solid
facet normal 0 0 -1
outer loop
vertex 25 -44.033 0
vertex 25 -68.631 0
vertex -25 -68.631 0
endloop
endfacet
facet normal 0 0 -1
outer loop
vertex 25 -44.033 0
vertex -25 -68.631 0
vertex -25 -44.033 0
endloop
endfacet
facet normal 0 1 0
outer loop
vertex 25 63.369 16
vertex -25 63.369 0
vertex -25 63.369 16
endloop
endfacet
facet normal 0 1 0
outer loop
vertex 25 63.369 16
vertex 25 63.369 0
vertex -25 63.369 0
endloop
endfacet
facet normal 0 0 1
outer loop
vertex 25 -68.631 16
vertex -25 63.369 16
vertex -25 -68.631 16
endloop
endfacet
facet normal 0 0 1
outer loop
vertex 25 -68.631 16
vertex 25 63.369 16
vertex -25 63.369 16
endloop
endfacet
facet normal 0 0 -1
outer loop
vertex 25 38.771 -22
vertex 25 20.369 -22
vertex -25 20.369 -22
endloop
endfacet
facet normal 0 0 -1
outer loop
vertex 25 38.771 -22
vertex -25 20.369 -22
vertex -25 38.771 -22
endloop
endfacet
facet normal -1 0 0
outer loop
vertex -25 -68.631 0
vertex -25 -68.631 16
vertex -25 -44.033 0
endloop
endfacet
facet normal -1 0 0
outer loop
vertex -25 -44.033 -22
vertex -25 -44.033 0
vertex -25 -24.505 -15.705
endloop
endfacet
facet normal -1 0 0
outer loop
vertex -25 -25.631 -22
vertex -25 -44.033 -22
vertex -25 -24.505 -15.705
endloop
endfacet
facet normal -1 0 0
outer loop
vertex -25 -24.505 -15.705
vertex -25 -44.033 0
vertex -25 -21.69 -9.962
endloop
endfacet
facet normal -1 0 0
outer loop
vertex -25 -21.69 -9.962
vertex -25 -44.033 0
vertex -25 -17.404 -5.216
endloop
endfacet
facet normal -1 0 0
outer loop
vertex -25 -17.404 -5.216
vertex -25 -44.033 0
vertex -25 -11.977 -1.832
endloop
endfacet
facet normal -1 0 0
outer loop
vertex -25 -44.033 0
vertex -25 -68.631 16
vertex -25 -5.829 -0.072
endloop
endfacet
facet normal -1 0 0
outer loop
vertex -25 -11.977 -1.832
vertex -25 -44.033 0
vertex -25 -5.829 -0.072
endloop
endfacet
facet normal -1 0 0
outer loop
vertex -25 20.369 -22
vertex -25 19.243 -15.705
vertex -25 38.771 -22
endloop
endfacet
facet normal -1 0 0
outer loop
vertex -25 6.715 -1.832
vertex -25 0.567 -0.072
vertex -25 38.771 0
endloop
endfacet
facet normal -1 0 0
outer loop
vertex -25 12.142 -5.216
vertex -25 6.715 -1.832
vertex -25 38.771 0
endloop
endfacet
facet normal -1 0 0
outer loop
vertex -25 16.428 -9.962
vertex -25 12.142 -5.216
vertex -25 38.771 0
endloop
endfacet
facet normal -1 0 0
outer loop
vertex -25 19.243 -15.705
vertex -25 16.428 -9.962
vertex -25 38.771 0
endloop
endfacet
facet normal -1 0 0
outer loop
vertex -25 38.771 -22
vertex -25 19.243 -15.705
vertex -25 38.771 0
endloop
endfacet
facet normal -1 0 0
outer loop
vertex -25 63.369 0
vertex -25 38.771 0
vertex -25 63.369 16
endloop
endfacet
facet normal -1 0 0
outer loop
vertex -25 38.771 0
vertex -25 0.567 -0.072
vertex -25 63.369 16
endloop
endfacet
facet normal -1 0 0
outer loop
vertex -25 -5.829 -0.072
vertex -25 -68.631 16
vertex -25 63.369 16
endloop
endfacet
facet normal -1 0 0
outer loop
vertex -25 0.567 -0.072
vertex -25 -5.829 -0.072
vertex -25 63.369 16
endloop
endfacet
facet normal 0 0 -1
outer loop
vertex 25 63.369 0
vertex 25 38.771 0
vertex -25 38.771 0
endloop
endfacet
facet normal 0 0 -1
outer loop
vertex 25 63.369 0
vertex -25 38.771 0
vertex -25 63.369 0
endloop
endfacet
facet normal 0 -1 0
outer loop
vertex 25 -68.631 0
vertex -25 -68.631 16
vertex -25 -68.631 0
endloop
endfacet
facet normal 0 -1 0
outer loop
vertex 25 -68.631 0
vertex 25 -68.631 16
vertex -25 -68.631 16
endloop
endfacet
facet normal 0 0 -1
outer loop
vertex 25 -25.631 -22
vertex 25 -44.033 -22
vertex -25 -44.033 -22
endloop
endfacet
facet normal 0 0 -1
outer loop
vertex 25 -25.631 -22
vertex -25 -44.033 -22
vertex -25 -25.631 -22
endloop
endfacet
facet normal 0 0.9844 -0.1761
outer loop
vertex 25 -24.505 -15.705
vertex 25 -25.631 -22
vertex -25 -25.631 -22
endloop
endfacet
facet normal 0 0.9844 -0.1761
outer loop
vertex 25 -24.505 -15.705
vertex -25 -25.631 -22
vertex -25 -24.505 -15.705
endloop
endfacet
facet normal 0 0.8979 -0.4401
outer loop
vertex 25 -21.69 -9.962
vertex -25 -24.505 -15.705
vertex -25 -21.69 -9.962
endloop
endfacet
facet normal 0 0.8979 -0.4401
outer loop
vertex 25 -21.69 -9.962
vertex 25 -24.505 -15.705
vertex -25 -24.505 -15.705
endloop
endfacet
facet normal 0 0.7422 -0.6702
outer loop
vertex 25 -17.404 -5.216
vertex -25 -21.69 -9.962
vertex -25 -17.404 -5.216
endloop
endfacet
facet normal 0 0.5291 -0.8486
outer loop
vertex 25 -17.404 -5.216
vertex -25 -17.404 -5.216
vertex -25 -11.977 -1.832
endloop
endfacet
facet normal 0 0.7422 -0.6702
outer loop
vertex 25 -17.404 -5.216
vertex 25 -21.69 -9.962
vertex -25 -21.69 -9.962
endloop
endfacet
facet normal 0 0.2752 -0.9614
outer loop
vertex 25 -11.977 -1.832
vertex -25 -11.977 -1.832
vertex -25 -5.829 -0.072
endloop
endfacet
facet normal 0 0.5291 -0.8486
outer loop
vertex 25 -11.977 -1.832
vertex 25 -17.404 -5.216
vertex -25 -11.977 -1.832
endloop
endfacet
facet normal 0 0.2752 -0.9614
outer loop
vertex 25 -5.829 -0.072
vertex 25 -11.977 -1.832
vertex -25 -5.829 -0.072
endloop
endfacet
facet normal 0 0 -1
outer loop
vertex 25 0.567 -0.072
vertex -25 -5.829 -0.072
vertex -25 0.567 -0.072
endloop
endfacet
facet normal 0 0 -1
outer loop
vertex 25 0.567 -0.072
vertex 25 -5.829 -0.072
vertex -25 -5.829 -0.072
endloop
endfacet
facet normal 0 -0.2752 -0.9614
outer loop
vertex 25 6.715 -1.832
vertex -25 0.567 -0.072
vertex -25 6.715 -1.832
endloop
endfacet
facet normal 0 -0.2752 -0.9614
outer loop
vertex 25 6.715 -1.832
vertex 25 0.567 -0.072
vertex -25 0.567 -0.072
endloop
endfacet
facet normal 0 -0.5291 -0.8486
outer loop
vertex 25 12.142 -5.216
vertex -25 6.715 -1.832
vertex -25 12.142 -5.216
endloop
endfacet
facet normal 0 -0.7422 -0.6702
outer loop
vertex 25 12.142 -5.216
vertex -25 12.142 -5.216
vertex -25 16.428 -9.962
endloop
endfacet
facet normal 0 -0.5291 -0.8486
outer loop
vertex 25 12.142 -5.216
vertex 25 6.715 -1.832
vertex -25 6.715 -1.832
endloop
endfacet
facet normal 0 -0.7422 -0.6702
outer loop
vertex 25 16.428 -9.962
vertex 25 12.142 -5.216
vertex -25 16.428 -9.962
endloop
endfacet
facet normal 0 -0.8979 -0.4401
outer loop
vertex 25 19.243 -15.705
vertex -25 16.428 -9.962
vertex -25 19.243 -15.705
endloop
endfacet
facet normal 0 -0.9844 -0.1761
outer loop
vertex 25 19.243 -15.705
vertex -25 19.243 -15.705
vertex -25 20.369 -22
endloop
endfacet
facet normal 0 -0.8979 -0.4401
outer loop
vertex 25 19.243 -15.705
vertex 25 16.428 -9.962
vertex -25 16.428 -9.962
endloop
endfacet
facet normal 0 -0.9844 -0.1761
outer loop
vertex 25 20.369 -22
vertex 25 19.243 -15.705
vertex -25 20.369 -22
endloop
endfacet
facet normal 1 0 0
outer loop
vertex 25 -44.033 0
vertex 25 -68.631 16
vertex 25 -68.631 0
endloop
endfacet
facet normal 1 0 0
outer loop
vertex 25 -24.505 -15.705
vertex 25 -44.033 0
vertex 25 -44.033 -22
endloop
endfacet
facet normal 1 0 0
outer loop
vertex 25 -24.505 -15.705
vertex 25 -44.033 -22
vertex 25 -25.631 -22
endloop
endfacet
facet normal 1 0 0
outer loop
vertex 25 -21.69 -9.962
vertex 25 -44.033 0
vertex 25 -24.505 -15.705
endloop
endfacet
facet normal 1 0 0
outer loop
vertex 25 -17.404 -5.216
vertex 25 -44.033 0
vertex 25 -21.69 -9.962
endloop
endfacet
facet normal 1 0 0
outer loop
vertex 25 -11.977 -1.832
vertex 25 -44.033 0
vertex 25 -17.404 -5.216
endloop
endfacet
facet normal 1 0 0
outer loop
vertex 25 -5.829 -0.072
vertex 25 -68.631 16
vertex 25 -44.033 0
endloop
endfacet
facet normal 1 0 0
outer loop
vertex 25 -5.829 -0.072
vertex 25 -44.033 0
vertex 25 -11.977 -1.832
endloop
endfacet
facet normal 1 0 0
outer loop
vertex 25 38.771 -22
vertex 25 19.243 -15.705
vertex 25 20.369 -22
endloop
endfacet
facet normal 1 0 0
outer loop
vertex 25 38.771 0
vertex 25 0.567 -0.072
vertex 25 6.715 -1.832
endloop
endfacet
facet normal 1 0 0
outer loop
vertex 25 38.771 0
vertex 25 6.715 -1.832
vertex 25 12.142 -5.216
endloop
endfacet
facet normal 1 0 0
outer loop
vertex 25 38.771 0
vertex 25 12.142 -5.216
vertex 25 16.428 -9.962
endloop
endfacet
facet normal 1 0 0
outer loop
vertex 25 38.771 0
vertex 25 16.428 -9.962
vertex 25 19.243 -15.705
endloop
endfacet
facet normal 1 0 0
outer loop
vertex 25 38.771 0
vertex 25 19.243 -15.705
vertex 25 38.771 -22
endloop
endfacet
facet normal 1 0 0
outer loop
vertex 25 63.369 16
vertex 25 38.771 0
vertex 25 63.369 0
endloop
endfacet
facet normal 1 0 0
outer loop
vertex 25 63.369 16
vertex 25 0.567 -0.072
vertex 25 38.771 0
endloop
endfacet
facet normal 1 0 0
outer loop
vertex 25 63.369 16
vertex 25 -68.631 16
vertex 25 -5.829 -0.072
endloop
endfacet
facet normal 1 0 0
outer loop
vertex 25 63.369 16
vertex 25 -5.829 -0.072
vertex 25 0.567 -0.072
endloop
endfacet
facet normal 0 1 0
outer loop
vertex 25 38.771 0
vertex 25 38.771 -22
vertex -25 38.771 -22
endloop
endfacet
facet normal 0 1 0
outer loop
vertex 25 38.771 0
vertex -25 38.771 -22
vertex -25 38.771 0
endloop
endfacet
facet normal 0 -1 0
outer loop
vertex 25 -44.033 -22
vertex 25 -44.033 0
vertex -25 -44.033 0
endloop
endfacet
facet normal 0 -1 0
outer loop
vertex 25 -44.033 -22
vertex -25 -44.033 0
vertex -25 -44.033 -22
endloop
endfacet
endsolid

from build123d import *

# Parameters (mm, degrees)
F1_DEPTH = 25


with BuildPart() as f1:
    # F0 (on Right) → F1 (new body, symmetric)
    with BuildSketch(Plane.YZ):
        with BuildLine():
            Line((-68.631068, 16), (-68.631068, 0))
            Line((-68.631068, 0), (-44.032769, 0))
            Line((-44.032769, 0), (-44.032769, -22))
            Line((-44.032769, -22), (-25.631068, -22))
            ThreePointArc((-25.631068, -22), (-2.631068, 0.150878), (20.368932, -22))
            Line((20.368932, -22), (38.770634, -22))
            Line((38.770634, -22), (38.770634, 0))
            Line((38.770634, 0), (63.368932, 0))
            Line((63.368932, 0), (63.368932, 16))
            Line((63.368932, 16), (-68.631068, 16))
        make_face()
    extrude(amount=F1_DEPTH, both=True)


solid = f1.part
